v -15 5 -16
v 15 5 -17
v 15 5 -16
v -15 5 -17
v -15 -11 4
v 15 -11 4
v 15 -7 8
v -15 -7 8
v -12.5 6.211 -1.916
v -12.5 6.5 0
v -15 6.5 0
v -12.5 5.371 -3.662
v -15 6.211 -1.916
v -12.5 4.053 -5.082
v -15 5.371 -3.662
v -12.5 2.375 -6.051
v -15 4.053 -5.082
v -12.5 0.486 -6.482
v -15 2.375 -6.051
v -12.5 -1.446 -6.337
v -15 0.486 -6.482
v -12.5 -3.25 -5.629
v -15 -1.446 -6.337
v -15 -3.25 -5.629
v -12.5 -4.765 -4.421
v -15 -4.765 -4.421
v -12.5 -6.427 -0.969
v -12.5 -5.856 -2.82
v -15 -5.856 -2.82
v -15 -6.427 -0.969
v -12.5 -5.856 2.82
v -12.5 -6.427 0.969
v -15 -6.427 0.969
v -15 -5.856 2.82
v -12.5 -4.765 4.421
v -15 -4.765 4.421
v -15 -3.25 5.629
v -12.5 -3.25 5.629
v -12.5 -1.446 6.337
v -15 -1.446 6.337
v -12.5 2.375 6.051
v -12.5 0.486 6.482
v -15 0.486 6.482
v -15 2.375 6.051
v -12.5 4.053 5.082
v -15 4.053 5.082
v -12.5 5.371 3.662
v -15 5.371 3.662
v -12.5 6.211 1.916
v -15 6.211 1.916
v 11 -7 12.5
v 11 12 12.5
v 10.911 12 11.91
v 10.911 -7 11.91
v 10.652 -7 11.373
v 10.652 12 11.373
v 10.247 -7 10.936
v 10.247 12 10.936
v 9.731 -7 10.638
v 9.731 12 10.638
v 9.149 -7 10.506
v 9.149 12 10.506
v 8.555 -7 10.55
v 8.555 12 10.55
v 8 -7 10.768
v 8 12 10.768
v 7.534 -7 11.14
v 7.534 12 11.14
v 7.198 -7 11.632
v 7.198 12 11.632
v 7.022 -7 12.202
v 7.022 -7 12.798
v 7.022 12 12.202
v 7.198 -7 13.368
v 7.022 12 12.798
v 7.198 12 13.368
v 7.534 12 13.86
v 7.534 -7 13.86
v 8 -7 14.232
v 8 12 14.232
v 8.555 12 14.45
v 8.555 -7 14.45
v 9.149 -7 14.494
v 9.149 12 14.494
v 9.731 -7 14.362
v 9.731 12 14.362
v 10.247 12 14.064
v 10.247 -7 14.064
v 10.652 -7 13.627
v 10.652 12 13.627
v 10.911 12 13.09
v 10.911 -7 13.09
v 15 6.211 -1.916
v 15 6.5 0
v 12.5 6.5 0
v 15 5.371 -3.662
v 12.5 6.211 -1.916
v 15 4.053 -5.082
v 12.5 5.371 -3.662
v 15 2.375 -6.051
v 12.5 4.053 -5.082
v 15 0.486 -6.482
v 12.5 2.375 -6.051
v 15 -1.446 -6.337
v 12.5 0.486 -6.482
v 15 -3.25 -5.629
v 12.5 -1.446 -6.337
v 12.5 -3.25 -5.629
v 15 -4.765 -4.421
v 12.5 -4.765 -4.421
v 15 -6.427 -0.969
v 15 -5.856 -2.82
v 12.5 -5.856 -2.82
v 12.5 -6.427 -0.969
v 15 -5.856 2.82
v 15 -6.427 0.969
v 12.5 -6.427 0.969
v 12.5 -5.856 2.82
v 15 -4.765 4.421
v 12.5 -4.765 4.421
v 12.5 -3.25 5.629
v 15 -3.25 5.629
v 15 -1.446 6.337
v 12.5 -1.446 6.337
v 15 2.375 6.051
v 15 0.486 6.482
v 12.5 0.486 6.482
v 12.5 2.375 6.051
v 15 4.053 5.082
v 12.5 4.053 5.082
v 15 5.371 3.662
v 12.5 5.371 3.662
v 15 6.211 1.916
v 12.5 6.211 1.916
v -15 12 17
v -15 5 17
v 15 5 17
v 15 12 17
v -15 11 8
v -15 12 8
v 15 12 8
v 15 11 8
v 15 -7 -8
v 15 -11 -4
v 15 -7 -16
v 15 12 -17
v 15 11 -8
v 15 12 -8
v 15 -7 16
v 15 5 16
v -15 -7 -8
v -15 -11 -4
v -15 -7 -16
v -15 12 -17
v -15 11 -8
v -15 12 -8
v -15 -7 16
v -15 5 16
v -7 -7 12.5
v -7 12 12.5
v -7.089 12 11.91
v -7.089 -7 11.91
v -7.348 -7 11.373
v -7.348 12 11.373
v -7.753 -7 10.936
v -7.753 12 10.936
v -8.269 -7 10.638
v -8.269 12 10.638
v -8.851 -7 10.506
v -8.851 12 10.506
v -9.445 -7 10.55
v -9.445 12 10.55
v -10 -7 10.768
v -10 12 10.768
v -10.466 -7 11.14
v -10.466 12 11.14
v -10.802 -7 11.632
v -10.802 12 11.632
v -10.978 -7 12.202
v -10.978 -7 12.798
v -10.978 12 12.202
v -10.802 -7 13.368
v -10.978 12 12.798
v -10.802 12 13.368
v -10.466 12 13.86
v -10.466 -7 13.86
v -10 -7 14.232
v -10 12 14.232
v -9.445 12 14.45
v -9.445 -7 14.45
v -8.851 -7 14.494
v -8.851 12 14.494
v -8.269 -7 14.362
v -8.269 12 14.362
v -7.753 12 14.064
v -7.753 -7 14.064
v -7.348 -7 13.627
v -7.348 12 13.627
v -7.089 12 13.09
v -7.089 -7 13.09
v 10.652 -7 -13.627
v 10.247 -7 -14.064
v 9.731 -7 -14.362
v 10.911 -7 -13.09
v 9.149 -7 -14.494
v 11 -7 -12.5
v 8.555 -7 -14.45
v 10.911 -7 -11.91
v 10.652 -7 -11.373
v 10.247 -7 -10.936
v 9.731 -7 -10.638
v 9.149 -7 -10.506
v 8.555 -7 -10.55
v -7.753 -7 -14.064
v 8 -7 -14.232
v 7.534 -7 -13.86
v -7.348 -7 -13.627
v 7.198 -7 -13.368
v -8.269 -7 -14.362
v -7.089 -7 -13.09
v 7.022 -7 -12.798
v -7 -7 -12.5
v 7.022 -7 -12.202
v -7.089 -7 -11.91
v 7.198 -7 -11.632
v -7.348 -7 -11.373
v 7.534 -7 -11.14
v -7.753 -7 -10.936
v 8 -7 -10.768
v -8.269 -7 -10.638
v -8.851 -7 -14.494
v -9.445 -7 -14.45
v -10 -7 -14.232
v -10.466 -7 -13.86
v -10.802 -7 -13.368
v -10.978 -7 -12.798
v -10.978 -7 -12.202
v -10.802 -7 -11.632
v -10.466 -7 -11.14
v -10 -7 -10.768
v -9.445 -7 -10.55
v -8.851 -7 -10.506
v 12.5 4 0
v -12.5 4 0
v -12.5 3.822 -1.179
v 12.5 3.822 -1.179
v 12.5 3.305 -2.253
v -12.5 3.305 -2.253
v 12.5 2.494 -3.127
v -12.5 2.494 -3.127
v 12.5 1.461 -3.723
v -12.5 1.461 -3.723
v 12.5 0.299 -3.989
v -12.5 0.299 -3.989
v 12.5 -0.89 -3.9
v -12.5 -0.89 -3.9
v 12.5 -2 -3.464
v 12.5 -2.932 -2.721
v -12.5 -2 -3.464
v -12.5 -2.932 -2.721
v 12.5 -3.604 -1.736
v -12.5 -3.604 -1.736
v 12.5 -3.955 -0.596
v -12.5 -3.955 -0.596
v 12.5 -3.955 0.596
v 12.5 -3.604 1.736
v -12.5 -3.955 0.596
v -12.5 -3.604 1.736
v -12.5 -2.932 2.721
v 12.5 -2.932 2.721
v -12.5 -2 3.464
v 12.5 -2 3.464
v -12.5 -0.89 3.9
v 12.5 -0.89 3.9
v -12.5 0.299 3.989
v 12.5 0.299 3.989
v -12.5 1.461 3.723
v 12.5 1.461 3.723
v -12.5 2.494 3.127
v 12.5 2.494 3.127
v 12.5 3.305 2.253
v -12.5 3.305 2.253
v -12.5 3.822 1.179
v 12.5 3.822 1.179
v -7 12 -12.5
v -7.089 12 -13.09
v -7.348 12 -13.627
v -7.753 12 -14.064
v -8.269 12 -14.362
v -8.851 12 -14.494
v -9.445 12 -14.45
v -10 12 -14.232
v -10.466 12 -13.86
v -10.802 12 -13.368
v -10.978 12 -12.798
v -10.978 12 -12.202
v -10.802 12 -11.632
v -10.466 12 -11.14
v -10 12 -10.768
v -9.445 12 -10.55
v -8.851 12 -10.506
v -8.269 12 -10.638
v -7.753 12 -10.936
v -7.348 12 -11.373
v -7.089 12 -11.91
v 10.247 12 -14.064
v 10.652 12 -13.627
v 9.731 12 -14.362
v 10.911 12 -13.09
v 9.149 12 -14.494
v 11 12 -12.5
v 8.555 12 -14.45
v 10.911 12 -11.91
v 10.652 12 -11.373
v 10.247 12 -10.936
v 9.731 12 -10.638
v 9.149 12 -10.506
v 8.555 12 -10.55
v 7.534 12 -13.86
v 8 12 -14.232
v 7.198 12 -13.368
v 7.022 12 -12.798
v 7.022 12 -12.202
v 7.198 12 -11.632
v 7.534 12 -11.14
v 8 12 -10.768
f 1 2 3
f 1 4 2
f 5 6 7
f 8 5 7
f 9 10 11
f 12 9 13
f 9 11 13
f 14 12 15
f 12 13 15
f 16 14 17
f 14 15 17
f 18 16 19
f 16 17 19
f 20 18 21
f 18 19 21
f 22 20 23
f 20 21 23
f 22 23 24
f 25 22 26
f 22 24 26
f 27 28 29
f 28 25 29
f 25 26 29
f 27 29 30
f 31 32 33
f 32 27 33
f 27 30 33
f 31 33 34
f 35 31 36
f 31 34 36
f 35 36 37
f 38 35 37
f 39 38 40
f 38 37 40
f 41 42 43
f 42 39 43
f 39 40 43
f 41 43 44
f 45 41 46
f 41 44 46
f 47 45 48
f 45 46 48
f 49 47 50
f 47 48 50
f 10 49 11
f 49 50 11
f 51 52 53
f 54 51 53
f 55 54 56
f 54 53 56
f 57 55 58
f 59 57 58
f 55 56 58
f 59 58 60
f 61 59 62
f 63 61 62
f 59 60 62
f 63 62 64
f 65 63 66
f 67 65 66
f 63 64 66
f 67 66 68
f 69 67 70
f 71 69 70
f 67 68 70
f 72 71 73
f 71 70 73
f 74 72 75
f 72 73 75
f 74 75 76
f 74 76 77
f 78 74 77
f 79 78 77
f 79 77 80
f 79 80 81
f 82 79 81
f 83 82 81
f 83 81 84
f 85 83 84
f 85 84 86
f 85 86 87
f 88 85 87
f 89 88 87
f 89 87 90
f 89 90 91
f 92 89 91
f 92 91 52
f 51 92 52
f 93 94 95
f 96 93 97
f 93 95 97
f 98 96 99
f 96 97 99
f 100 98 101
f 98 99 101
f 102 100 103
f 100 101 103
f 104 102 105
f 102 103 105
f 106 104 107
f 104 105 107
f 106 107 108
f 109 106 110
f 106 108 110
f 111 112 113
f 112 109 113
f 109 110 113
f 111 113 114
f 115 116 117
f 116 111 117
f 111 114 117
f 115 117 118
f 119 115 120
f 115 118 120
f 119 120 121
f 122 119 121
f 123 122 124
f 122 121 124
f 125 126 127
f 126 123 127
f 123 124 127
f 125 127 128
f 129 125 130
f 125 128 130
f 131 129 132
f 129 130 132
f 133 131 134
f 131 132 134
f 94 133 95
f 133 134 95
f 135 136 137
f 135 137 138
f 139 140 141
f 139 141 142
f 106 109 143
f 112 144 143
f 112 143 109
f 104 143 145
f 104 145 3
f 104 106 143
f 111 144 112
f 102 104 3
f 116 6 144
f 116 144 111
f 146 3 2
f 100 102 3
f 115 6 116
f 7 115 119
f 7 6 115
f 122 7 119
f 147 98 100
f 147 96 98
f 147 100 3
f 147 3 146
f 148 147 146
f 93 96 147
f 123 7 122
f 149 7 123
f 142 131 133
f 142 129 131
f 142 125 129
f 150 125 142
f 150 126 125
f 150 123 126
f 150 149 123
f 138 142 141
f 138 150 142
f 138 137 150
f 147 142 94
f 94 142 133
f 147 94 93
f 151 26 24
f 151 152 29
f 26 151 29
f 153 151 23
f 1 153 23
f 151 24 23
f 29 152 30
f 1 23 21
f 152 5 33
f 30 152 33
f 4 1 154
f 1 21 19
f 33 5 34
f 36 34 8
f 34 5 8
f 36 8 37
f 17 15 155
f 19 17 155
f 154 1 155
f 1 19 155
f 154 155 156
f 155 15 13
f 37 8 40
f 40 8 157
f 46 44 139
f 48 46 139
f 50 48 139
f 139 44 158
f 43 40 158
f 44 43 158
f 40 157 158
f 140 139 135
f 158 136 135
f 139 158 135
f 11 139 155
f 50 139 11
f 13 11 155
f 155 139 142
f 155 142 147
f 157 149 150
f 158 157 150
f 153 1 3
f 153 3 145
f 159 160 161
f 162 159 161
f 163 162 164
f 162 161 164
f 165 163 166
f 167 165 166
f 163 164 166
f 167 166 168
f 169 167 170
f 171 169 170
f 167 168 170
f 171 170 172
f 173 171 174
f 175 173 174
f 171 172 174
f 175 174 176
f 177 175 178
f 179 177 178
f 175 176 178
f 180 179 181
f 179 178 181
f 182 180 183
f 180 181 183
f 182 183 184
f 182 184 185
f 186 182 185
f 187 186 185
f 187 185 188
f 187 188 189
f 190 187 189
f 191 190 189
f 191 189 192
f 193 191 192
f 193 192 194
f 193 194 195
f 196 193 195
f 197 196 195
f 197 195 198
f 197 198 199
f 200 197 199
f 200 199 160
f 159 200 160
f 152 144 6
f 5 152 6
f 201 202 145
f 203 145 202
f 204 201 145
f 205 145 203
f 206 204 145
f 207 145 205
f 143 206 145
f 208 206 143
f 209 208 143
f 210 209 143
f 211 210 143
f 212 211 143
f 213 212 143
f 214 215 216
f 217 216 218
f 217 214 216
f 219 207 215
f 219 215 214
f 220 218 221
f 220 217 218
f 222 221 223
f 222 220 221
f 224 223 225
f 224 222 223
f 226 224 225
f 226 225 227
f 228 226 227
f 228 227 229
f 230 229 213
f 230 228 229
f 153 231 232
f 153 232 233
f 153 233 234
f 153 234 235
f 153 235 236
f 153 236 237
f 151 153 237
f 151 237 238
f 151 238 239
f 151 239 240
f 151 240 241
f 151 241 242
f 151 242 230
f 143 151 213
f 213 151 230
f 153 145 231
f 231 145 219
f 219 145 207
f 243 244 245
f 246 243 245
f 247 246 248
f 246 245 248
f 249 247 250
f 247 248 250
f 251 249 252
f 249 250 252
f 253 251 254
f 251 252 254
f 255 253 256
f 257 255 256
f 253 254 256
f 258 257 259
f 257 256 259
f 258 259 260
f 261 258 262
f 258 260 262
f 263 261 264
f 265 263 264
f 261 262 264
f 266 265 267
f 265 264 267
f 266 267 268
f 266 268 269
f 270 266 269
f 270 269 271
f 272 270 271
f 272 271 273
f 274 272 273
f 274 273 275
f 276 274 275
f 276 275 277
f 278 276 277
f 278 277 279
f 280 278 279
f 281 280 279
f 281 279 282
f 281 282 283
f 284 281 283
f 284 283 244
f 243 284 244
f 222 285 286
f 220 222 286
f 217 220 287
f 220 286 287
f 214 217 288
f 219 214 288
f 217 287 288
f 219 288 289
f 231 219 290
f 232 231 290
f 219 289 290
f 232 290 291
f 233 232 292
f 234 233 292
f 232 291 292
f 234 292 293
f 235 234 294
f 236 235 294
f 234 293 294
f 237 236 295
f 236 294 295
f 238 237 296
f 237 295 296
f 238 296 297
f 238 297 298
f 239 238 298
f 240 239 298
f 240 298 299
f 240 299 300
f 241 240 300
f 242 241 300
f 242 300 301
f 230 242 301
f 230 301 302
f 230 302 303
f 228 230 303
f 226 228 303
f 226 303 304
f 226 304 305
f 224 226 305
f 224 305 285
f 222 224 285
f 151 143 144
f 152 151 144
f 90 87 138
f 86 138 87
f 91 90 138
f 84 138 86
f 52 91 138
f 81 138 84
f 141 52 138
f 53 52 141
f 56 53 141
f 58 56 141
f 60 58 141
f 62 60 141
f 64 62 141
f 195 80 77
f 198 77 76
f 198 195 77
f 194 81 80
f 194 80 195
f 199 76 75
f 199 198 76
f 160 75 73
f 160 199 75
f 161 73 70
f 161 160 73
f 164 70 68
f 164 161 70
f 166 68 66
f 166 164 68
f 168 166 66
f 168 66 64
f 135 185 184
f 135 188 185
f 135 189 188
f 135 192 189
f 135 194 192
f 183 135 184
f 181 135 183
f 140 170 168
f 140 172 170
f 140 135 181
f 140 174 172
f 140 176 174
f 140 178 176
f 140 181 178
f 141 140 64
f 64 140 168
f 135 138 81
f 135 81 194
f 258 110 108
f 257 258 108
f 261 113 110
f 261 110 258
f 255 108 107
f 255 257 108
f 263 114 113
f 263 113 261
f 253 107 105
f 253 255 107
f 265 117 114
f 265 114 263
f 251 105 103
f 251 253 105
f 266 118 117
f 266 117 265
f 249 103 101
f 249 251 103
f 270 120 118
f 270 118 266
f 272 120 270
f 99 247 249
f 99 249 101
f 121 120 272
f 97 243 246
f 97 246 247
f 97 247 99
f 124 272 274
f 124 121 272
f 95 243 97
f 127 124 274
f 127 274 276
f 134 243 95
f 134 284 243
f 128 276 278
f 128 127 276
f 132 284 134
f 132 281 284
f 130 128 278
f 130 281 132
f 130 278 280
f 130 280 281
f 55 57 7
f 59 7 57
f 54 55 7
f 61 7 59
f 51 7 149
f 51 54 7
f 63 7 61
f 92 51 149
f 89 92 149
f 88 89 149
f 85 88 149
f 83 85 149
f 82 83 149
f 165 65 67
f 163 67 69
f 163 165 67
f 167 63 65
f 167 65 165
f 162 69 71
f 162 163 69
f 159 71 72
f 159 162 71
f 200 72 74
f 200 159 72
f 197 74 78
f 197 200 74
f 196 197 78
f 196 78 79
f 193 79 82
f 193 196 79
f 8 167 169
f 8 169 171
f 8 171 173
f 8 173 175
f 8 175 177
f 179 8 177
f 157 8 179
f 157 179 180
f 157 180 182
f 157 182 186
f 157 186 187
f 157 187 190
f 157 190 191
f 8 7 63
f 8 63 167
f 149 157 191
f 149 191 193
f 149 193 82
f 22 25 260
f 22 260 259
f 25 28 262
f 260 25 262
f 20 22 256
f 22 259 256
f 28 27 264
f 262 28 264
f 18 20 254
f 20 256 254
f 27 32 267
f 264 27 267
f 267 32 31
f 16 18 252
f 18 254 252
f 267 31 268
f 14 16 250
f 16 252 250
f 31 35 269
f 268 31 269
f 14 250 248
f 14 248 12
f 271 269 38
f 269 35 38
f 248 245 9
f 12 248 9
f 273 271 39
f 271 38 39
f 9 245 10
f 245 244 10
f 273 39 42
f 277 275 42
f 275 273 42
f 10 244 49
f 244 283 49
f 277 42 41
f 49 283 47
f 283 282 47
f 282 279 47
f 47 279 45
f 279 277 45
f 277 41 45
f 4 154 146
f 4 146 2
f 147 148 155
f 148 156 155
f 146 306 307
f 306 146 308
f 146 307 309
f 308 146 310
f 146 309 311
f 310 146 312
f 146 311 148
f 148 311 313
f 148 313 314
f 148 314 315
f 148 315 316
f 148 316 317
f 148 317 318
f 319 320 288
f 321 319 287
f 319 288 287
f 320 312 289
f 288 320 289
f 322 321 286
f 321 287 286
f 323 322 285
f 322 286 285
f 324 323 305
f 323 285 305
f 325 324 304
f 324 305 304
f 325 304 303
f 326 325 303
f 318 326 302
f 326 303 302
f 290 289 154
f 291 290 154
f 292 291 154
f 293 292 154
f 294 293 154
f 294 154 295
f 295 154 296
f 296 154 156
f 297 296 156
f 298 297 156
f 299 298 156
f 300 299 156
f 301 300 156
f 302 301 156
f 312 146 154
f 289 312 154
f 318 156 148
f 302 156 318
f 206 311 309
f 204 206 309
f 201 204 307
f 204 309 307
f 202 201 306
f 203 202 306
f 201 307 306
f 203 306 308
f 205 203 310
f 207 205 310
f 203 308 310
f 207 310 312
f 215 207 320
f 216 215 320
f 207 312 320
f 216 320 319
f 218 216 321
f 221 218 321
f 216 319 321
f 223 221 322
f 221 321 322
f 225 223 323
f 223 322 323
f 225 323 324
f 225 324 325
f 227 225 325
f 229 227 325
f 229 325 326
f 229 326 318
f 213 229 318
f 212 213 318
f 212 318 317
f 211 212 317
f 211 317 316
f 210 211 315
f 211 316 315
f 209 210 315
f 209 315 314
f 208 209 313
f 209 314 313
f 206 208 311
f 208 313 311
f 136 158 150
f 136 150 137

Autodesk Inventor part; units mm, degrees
ref_plane "YZ Plane" through (0, 0, 0) normal (1, 0, 0) x (0, 1, 0)
ref_plane "XZ Plane" through (0, 0, 0) normal (0, 1, 0) x (-1, 0, 0)
ref_plane "XY Plane" through (0, 0, 0) normal (0, 0, 1) x (1, 0, 0)
sketch "Sketch1" plane through (0, 0, 0) normal (1, 0, 0) x (0, 1, 0)
  circle A0 centre (0, 0) radius 4
  line L0 (0, 23.8) -> (0, -23.8) projected
  line L1 (-15.6, 0) -> (16.6, 0) projected
  line L2 (11, 17) -> (11, -17)
  line L3 (11, -17) -> (5, -17)
  line L4 (5, -17) -> (5, -16)
  line L5 (5, -16) -> (-7, -16)
  line L6 (-7, -16) -> (-7, -8)
  line L7 (-7, -8) -> (-11, -4)
  line L8 (-11, -4) -> (-11, 4)
  line L9 (-11, 4) -> (-7, 8)
  line L10 (-7, 8) -> (-7, 16)
  line L11 (-7, 16) -> (5, 16)
  line L12 (5, 16) -> (5, 17)
  line L13 (5, 17) -> (11, 17)
  circle A1 centre (0, 0) radius 6.5
  line L14 (11, -12) -> (-7, -12) construction
  line L15 (-7, -14) -> (11, -14) construction
  line L16 (11, -10) -> (-7, -10) construction
  line L17 (11, -17) -> (12, -17)
  line L18 (12, -17) -> (12, -8)
  line L19 (12, -8) -> (11, -8)
  line L20 (11, 17) -> (12, 17)
  line L21 (12, 17) -> (12, 8)
  line L22 (12, 8) -> (11, 8)
  dimension "d0" = 34
  dimension "d1" = 22
  dimension "d2" = 11
  dimension "d3" = 6
  dimension "d4" = 18
  dimension "d5" = 1
  dimension "d6" = 8
  dimension "d7" = 13
  dimension "d9" = 5
  dimension "d10" = 4
  dimension "d11" = 4
  dimension "d12" = 8
  dimension "d17" = 1
extrude "Extrusion1" add sketch "Sketch1" along normal mid plane 30 contours A1 L0 L11 L12 L13 L2 L1 | L1 L2 L3 L4 L5 L0 A1 | A1 L1 L8 L9 L10 L11 L0 | L0 L5 L6 L7 L8 L1 A1 | L2 L20 L21 L22 | L19 L18 L17 L2
extrude "Extrusion2" add sketch "Sketch1" along normal mid plane 25 contours L1 A1 L0 A0 | A0 L0 A1 L1 | A0 L1 A1 L0 | L0 A1 L1 A0
sketch "Sketch2" plane through (-15, 12, 17) normal (0, 1, 0) x (1, 0, 0)
  line L0 (30, 0) -> (0, 0) projected
  line L1 (30, 9) -> (30, 0) projected
  line L2 (0, 9) -> (30, 9) projected
  line L3 (0, 0) -> (0, 9) projected
  line L4 (0, 25) -> (30, 25) projected
  line L5 (30, 34) -> (30, 25) projected
  line L6 (0, 34) -> (30, 34) projected
  line L7 (0, 25) -> (0, 34) projected
  line L8 (36, 17) -> (-6, 17) projected
  line L9 (15, 40.8) -> (15, -6.8) projected
  circle A0 centre (6, 4.5) radius 2
  circle A1 centre (24, 4.5) radius 2
  circle A2 centre (6, 29.5) radius 2
  circle A3 centre (24, 29.5) radius 2
  point P0 (15, 17)
  dimension "d18" = 4.5
  dimension "d19" = 18
  dimension "d20" = 4
extrude "Extrusion3" cut sketch "Sketch2" against normal up to next contours A0 | A1 | A2 | A3
properties part number "Linear Bearing Platform Small" material "Aluminum 6061"
